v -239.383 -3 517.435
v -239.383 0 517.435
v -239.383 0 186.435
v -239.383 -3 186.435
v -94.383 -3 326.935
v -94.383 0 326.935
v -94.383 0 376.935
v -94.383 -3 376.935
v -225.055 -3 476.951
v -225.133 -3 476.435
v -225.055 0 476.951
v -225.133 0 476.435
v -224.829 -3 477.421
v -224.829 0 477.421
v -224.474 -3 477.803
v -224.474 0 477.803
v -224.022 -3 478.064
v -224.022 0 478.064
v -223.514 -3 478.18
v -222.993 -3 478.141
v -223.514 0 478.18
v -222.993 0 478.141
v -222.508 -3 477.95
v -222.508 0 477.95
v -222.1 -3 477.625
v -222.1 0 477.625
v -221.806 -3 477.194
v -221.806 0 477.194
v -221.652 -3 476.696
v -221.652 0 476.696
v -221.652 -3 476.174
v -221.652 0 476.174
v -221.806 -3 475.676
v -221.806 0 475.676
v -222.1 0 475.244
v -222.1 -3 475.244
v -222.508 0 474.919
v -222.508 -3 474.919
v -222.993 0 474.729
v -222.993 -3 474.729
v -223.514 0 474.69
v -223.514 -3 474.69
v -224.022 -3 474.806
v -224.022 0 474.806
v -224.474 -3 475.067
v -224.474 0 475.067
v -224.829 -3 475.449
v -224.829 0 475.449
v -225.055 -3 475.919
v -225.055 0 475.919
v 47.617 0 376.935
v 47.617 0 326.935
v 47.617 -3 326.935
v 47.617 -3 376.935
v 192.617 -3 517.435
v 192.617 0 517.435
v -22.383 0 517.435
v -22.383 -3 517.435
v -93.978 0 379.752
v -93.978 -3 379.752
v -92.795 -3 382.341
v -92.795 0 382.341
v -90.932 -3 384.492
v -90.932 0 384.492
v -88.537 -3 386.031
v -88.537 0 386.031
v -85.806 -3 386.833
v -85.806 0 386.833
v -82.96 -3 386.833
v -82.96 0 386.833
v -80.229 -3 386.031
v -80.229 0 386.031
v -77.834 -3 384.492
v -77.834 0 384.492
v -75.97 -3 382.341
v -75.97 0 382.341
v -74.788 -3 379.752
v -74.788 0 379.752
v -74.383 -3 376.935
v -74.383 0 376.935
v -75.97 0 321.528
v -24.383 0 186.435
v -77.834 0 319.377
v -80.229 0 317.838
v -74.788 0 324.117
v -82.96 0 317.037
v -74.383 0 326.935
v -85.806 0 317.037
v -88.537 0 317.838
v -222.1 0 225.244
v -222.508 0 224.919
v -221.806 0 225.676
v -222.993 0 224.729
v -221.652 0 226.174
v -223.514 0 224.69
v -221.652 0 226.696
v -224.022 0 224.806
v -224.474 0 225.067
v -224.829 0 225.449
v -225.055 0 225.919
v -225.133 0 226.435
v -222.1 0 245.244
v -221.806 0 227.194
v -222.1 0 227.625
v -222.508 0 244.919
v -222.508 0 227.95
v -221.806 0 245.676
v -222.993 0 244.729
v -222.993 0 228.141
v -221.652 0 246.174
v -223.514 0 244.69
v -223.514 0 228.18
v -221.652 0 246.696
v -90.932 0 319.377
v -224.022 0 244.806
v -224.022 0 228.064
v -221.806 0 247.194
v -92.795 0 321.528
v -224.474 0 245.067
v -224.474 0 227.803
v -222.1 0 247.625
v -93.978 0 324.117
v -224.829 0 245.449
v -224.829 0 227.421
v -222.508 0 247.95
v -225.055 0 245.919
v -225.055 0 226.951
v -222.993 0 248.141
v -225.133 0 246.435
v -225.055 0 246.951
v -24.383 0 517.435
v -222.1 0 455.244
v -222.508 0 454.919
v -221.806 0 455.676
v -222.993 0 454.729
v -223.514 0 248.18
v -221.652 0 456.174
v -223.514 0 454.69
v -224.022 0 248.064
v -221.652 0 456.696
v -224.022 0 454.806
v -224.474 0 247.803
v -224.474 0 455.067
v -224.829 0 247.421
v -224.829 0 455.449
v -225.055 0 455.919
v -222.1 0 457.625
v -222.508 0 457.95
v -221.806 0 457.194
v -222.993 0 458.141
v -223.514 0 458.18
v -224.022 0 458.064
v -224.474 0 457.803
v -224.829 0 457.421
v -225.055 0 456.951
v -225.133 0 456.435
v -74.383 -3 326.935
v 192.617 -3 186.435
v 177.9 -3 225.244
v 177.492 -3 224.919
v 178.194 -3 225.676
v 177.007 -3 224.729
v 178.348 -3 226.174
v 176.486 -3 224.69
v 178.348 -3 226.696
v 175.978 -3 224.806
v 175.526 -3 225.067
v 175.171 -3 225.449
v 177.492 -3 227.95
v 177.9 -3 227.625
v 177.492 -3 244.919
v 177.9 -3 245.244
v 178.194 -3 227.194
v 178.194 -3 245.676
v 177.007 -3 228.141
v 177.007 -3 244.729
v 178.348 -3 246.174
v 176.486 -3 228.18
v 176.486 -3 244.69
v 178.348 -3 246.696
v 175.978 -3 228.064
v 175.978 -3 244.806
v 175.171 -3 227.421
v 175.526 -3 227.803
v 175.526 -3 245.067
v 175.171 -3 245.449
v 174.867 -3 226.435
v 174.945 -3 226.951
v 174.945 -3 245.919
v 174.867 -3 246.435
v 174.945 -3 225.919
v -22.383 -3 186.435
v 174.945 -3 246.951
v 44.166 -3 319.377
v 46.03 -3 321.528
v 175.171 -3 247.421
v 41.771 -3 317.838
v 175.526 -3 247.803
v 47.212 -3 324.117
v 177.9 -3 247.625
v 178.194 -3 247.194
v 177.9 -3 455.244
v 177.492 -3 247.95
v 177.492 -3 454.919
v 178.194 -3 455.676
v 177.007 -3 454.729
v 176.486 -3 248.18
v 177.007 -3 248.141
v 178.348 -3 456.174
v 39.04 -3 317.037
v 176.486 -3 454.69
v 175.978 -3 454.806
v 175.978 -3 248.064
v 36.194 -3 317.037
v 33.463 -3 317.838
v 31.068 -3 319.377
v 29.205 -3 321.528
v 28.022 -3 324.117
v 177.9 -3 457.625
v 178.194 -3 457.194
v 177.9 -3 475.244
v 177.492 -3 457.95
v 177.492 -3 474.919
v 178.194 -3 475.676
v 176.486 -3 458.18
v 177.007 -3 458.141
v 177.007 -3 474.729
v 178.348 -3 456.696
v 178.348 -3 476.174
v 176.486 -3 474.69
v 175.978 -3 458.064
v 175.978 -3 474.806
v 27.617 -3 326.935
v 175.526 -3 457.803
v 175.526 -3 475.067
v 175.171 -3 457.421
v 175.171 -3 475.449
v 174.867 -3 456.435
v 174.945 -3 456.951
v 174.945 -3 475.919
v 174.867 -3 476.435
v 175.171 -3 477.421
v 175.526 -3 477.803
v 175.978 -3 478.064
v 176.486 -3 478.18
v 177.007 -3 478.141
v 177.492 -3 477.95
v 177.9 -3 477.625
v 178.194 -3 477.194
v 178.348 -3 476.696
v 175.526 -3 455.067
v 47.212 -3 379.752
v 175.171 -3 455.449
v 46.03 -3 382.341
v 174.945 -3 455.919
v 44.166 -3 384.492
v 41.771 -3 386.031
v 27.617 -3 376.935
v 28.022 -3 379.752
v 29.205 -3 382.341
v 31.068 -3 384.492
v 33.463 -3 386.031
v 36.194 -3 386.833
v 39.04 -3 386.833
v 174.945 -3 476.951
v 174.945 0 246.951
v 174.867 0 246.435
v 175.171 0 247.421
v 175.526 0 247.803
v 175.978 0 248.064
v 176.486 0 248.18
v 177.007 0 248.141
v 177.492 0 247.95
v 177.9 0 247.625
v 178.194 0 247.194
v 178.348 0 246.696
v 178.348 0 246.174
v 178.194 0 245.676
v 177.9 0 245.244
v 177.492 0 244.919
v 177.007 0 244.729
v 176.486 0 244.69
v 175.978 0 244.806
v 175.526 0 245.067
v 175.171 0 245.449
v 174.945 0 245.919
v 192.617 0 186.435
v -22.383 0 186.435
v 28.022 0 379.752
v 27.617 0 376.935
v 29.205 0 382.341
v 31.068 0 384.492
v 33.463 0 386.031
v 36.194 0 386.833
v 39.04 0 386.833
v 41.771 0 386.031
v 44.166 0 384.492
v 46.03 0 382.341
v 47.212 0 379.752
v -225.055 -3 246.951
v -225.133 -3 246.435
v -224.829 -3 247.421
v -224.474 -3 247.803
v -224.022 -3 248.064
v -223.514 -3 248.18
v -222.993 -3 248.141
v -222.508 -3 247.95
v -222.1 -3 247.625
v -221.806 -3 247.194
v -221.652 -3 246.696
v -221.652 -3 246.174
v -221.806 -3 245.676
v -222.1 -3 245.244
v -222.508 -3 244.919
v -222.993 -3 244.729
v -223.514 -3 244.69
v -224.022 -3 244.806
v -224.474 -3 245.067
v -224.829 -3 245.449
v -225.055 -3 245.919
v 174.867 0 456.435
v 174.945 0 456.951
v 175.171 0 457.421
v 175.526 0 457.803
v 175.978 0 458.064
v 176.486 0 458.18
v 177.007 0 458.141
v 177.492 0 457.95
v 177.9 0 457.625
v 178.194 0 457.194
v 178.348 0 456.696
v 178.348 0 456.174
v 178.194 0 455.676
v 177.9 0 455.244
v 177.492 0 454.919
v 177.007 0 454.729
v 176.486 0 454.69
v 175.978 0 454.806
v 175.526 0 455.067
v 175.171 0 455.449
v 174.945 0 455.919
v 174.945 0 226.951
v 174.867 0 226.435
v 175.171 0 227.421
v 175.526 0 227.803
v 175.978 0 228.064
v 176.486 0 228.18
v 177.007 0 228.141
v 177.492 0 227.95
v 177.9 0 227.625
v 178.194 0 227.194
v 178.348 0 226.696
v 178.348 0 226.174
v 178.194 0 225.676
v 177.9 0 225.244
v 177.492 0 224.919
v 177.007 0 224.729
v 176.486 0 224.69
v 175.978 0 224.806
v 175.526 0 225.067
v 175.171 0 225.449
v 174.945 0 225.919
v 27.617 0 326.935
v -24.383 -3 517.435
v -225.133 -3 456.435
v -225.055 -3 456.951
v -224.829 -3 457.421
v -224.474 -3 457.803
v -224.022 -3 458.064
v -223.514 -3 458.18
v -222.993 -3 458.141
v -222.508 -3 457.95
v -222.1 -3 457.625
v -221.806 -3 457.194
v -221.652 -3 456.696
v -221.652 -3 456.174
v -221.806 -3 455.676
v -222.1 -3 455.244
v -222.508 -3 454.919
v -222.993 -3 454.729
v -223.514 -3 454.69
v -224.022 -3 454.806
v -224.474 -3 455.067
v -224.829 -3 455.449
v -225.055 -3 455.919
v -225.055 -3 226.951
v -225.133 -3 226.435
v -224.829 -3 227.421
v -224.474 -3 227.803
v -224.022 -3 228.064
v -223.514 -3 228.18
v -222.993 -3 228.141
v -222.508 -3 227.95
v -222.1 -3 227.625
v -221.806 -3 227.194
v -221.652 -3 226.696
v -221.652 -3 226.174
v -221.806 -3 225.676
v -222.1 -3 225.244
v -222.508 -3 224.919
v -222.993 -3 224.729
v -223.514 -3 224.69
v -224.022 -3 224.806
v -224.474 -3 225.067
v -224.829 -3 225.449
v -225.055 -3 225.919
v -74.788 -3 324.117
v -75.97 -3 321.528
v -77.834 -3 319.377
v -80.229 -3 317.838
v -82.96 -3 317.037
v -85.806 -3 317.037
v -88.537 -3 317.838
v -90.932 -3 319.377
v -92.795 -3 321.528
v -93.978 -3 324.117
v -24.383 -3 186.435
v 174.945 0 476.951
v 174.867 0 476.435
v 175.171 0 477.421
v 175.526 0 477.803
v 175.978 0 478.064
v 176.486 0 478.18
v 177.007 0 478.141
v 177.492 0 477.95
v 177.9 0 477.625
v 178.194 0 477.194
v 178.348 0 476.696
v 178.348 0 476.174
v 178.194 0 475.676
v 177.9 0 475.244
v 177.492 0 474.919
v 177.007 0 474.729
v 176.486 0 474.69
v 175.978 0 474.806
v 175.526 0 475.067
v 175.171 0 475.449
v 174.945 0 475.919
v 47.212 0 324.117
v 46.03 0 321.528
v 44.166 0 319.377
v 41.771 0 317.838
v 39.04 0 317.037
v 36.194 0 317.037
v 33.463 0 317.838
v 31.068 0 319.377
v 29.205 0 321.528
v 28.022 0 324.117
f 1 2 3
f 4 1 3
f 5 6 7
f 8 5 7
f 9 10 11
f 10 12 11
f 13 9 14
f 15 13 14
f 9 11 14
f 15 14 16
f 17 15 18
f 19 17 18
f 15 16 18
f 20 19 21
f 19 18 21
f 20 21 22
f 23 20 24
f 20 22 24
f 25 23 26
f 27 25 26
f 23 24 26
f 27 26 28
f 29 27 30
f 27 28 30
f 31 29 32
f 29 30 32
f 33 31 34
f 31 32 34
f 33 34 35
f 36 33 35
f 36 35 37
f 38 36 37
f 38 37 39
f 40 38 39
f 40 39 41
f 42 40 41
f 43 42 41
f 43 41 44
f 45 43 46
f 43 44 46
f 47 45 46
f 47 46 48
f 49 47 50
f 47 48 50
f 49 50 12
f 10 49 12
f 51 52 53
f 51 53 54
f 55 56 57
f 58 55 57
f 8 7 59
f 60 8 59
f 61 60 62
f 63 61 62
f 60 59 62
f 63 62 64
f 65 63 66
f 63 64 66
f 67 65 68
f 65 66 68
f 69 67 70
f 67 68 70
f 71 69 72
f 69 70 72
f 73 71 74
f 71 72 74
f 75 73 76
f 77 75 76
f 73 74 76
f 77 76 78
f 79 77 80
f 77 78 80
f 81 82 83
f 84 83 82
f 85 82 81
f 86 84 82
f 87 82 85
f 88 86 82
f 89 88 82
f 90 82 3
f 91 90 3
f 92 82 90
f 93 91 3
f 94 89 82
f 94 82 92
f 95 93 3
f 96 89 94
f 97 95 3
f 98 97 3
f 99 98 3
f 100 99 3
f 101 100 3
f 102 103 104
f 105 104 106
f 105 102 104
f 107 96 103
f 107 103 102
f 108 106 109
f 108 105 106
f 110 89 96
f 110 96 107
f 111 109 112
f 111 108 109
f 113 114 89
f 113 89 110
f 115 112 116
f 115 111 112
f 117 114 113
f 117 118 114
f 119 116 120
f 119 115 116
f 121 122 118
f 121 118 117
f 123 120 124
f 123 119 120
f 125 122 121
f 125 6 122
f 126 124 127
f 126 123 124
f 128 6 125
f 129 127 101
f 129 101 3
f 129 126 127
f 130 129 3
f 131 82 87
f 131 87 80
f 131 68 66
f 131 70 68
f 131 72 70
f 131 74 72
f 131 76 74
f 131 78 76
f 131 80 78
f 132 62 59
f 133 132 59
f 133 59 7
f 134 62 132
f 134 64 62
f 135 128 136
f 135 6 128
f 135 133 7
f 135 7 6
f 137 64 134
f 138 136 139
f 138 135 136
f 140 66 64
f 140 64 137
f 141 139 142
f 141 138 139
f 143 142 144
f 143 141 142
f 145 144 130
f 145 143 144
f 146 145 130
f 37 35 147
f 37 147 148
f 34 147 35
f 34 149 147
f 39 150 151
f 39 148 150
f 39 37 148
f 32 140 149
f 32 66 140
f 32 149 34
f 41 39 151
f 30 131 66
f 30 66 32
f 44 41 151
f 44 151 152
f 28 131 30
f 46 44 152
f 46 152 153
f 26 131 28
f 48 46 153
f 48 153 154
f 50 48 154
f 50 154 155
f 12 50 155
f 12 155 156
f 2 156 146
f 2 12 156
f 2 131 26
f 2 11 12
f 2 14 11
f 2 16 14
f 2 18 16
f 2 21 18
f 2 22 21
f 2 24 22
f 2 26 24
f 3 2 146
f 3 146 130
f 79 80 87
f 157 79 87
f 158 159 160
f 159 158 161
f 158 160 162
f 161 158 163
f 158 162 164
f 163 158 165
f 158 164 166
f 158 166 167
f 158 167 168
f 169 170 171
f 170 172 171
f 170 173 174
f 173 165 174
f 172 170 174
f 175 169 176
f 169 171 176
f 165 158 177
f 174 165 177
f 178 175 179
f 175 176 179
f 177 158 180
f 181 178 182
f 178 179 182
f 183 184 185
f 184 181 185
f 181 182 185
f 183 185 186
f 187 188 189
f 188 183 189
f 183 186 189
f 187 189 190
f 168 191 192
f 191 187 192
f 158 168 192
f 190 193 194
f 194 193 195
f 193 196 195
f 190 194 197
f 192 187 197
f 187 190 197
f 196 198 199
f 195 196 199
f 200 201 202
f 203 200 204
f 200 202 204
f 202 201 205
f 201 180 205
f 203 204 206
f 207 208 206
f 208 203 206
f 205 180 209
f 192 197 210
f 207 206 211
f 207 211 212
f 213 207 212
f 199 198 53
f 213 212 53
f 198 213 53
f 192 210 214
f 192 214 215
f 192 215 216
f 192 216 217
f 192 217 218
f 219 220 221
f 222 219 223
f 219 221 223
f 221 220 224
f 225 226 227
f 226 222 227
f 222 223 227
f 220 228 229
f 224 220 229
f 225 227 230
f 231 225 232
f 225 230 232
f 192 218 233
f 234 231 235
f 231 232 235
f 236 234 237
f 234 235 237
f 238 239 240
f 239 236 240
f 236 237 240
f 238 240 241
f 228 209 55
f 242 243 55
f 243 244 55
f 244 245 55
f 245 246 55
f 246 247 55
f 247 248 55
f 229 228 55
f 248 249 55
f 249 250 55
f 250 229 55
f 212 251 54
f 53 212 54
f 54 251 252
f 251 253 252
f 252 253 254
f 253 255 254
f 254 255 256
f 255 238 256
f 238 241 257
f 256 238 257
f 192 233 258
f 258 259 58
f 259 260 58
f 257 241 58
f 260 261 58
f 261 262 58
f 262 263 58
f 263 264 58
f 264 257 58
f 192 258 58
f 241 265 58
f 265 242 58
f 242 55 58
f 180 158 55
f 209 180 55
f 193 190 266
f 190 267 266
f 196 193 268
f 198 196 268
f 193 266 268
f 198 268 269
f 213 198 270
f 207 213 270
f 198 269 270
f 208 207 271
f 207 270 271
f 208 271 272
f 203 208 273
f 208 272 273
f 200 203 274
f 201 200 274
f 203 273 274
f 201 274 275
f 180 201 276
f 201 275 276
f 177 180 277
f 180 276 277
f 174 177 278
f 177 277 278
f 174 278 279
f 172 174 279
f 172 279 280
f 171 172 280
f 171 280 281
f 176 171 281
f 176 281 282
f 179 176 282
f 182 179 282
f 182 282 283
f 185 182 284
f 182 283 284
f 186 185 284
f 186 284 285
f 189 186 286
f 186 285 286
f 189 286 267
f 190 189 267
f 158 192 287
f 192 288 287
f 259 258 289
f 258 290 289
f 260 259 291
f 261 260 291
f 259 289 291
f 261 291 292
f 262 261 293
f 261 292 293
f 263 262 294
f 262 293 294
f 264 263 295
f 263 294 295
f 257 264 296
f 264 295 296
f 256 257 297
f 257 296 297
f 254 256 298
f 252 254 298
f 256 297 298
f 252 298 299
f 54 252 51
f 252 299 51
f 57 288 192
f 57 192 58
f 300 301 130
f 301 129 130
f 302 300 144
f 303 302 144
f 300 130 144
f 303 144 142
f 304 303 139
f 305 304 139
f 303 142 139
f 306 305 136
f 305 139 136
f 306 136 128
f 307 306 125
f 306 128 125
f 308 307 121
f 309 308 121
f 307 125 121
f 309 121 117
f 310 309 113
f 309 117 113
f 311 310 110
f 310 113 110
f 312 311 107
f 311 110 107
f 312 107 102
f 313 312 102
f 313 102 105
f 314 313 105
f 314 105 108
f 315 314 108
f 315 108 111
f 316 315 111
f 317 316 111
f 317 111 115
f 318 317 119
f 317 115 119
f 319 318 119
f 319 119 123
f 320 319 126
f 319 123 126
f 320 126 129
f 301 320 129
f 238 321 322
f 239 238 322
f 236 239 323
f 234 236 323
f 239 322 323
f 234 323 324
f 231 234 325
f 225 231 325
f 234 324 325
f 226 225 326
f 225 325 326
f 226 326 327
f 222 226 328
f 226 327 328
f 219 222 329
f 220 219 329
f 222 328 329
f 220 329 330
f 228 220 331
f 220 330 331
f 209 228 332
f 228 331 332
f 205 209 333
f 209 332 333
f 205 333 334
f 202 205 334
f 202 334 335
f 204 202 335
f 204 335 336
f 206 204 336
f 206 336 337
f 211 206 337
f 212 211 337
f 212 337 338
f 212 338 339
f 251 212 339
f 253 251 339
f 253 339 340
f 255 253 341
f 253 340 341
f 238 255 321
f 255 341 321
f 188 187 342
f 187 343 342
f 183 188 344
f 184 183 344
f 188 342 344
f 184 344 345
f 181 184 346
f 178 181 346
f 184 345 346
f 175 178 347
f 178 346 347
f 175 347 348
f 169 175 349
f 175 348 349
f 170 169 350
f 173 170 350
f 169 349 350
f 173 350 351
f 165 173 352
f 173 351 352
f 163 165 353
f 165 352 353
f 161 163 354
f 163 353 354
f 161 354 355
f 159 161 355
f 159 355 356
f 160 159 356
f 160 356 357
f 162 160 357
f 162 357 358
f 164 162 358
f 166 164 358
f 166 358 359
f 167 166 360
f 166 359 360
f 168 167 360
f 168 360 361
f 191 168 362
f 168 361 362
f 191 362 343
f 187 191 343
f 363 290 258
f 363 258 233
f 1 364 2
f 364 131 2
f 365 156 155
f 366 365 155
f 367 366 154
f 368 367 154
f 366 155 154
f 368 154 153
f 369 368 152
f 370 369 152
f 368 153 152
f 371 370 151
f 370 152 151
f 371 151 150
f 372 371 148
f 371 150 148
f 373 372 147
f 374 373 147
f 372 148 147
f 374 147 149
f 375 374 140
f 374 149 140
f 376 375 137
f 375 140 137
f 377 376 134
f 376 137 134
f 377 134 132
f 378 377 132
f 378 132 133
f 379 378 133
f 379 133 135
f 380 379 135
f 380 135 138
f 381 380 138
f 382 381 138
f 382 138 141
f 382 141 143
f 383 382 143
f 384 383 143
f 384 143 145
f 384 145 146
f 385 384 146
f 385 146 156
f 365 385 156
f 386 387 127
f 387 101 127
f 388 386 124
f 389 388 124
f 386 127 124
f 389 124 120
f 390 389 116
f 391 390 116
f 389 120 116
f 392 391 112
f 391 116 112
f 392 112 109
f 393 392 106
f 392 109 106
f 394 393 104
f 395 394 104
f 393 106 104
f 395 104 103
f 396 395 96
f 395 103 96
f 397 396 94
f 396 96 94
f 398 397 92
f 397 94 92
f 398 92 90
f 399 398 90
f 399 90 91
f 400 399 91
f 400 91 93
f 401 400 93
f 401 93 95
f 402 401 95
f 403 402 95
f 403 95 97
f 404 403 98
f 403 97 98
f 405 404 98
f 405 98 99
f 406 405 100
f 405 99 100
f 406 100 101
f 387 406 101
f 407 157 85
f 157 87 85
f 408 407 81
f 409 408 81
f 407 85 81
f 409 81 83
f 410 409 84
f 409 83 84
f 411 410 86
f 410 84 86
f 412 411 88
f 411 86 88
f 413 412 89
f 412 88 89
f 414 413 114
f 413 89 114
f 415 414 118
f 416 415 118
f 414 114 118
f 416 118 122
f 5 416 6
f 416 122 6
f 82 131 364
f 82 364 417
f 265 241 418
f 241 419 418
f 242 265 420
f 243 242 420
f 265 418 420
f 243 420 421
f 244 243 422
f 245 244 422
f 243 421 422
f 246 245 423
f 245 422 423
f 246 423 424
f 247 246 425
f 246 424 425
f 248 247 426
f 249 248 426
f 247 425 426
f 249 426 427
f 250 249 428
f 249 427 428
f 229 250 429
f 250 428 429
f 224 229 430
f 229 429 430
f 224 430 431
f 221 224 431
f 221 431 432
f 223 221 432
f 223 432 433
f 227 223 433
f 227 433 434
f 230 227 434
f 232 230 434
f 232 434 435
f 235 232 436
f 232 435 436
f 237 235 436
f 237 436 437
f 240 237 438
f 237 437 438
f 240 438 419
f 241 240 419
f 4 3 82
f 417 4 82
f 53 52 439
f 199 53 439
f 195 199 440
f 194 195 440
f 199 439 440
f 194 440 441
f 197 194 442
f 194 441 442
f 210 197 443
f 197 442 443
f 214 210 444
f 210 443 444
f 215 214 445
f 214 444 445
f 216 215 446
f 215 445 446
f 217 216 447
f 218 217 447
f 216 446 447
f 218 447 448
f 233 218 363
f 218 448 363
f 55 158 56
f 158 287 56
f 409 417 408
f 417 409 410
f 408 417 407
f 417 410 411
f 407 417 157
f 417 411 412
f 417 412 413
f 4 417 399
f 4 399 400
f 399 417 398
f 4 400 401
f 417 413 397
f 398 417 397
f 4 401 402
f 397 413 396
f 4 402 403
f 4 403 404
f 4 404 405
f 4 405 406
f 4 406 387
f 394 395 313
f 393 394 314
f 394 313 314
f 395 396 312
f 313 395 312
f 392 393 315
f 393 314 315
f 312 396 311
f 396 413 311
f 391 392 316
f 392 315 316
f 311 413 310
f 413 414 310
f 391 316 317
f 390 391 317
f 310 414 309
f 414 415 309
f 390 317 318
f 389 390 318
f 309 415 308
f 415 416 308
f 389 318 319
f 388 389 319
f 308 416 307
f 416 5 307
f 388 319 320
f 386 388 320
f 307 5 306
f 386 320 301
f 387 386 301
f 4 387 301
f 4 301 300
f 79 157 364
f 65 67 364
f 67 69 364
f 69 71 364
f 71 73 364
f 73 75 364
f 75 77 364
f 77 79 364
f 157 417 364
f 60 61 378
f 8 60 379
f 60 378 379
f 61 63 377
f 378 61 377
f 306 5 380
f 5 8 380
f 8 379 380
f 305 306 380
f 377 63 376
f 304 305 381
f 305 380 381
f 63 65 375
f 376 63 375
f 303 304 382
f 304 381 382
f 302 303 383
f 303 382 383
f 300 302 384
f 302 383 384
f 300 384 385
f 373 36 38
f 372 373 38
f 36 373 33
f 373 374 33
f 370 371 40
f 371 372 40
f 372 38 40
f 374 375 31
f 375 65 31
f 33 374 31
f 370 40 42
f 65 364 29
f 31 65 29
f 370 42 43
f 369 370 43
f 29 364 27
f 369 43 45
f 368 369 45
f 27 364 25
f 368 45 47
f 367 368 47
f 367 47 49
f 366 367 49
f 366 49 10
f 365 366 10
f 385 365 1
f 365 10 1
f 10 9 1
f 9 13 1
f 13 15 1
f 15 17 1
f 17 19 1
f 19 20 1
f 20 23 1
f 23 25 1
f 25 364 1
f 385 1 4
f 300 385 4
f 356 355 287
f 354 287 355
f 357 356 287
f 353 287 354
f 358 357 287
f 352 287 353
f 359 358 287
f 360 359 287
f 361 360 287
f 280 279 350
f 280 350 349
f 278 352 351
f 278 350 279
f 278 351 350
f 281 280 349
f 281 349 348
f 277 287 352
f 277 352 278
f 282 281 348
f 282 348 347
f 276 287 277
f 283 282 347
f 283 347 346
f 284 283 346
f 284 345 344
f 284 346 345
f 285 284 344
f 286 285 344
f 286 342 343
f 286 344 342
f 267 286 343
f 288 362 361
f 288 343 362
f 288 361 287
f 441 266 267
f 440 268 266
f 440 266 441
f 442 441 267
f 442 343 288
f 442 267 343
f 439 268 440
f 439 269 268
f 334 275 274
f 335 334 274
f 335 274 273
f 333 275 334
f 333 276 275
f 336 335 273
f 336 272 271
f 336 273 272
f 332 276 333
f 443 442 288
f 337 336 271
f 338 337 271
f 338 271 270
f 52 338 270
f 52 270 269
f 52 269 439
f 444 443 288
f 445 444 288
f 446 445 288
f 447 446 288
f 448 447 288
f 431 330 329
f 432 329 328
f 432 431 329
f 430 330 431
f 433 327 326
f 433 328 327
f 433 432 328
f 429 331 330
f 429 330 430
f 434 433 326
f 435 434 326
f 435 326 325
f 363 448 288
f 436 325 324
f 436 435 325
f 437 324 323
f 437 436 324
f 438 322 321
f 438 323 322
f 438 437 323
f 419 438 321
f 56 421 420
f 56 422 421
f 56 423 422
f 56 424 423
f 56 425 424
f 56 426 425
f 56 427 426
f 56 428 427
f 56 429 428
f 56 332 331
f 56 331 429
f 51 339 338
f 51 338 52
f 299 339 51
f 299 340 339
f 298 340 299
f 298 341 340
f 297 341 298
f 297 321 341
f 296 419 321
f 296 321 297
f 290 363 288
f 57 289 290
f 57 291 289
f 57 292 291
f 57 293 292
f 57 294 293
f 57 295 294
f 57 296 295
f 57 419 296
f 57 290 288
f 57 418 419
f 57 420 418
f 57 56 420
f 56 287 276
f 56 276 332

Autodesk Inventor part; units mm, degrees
ref_plane "YZ Plane" through (0, 0, 0) normal (1, 0, 0) x (0, 1, 0)
ref_plane "XZ Plane" through (0, 0, 0) normal (0, 1, 0) x (-1, 0, 0)
ref_plane "XY Plane" through (0, 0, 0) normal (0, 0, 1) x (1, 0, 0)
sketch "Sketch1" plane through (0, 0, 0) normal (0, 1, 0) x (-1, 0, 0)
  circle A0 centre (104.8829, 126.4348) radius 1.25 projected
  circle A1 centre (139.8829, 126.4348) radius 1.25 projected
  circle A2 centre (-92.6171, 155.4348) radius 1.6 projected
  circle A3 centre (210.3829, 138.4348) radius 11.5 projected
  circle A4 centre (-92.6171, 114.4348) radius 1.6 projected
  line L0 (-122.7381, 154.8468) -> (-122.7381, 115.0468) projected
  line L1 (-122.7381, 115.0468) -> (-181.8381, 115.0468) projected
  line L2 (-181.8381, 115.0468) -> (-181.8381, 154.8468) projected
  line L3 (-181.8381, 154.8468) -> (-122.7381, 154.8468) projected
  circle A5 centre (95.3829, 138.4348) radius 12.5 projected
  circle A6 centre (130.3829, 138.4348) radius 12.5 projected
  circle A7 centre (120.8829, 150.4348) radius 1.25 projected
  circle A8 centre (-102.5711, 120.4348) radius 2.5 projected
  circle A9 centre (-185.6171, 155.4348) radius 1.6 projected
  circle A10 centre (-185.6171, 114.4348) radius 1.6 projected
  circle A11 centre (-102.5711, 138.2317) radius 4.5 projected
  circle A12 centre (85.8829, 150.4348) radius 1.25 projected
  circle A13 centre (-52.5711, 138.4348) radius 8 projected
  line L4 (240.3829, 518.4348) -> (240.3829, 185.4348) projected
  line L5 (240.3829, 185.4348) -> (-193.6171, 185.4348) projected
  line L6 (-193.6171, 185.4348) -> (-193.6171, 518.4348) projected
  line L7 (-193.6171, 518.4348) -> (240.3829, 518.4348) projected
  line L8 (290.3829, 78.4348) -> (-243.6171, 78.4348) projected
  line L9 (290.3829, 558.4348) -> (290.3829, 78.4348) projected
  line L10 (-243.6171, 558.4348) -> (290.3829, 558.4348) projected
  line L11 (-243.6171, 78.4348) -> (-243.6171, 558.4348) projected
  circle A14 centre (-234.1171, 143.4348) radius 1.75 projected
  circle A15 centre (-141.6171, 550.9348) radius 1.75 projected
  circle A16 centre (23.3829, 550.9348) radius 1.75 projected
  circle A17 centre (188.3829, 85.9348) radius 1.75 projected
  circle A18 centre (23.3829, 85.9348) radius 1.75 projected
  circle A19 centre (-141.6171, 85.9348) radius 1.75 projected
  circle A20 centre (280.8829, 493.4348) radius 1.75 projected
  circle A21 centre (280.8829, 143.4348) radius 1.75 projected
  circle A22 centre (-234.1171, 493.4348) radius 1.75 projected
  circle A23 centre (188.3829, 550.9348) radius 1.75 projected
  circle A24 centre (-176.6171, 226.4348) radius 1.75 projected
  circle A25 centre (-176.6171, 246.4348) radius 1.75 projected
  circle A26 centre (-176.6171, 456.4348) radius 1.75 projected
  circle A27 centre (-176.6171, 476.4348) radius 1.75 projected
  circle A28 centre (223.3829, 476.4348) radius 1.75 projected
  circle A29 centre (223.3829, 456.4348) radius 1.75 projected
  circle A30 centre (223.3829, 226.4348) radius 1.75 projected
  circle A31 centre (223.3828, 246.4348) radius 1.75 projected
  line L12 (-192.6171, 517.4348) -> (239.3829, 517.4348)
  line L13 (239.3829, 517.4348) -> (239.3829, 186.4348)
  line L14 (239.3829, 186.4348) -> (-192.6171, 186.4348)
  line L15 (-192.6171, 186.4348) -> (-192.6171, 517.4348)
  point P0 (0, 0)
  dimension "d0" = 1
  dimension "d1" = 1
  dimension "d2" = 1
  dimension "d3" = 1
extrude "Extrusion1" add sketch "Sketch1" against normal blind 3 contours L12 L13 L14 L15
sketch "Sketch2" plane through (0, 0, 0) normal (0, 1, 0) x (1, 0, 0)
  line L0 (192.6171, -186.4348) -> (-239.3829, -186.4348) projected
  line L1 (-239.3829, -186.4348) -> (-239.3829, -517.4348) projected
  line L2 (-239.3829, -517.4348) -> (192.6171, -517.4348) projected
  line L3 (192.6171, -517.4348) -> (192.6171, -186.4348) projected
  circle A0 centre (176.6171, -476.4348) radius 1.75 projected
  circle A1 centre (176.6171, -246.4348) radius 1.75 projected
  circle A2 centre (176.6171, -226.4348) radius 1.75 projected
  circle A3 centre (176.6171, -456.4348) radius 1.75 projected
  line L4 (-239.3829, -186.4348) -> (192.6171, -186.4348) projected
  line L5 (-22.3829, -186.4348) -> (-22.3829, -517.4348)
  line L6 (192.6171, -517.4348) -> (-239.3829, -517.4348) projected
  line L7 (-24.3829, -517.4348) -> (-24.3829, -186.4348)
  circle A4 centre (-23.3829, -203.4348) radius 3 projected
  line L8 (37.6171, -376.9348) -> (37.6171, -326.9348) construction
  line L9 (27.6171, -376.9348) -> (27.6171, -326.9348)
  line L10 (47.6171, -326.9348) -> (47.6171, -376.9348)
  arc A5 (27.6171, -376.9348) -> (47.6171, -376.9348) centre (37.6171, -376.9348) ccw
  arc A6 (47.6171, -326.9348) -> (27.6171, -326.9348) centre (37.6171, -326.9348) ccw
  line L11 (-84.3829, -376.9348) -> (-84.3829, -326.9348) construction
  line L12 (-74.3829, -376.9348) -> (-74.3829, -326.9348)
  line L13 (-94.3829, -326.9348) -> (-94.3829, -376.9348)
  arc A7 (-94.3829, -376.9348) -> (-74.3829, -376.9348) centre (-84.3829, -376.9348) ccw
  arc A8 (-74.3829, -326.9348) -> (-94.3829, -326.9348) centre (-84.3829, -326.9348) ccw
  point P0 (0, 0)
  point P1 (37.6171, -351.9348)
  point P2 (-84.3829, -351.9348)
  point P3 (-24.3829, -351.9348)
  point P4 (-22.3829, -351.9348)
  point P5 (-22.3829, -206.2632)
  point P6 (-24.3829, -206.2632)
  point P7 (-24.3829, -517.4348)
  dimension "d6" = 1
  dimension "d7" = 1
  dimension "d8" = 50
  dimension "d9" = 50
  dimension "d10" = 50
  dimension "d11" = 10
extrude "Extrusion2" cut sketch "Sketch2" against normal blind 3 contours L5 A4 L7 L0 | L5 A4 L7 | L2 L7 A4 L5 | L9 A6 L10 A5 | A7 L13 A8 L12
equation "\"d1\" = d0"
equation "\"d2\" = d0"
equation "\"d3\" = d0"
equation "\"d7\" = d6"
equation "\"d9\" = d8"
properties part number "Door Panel" material "PMMA Plastic"
